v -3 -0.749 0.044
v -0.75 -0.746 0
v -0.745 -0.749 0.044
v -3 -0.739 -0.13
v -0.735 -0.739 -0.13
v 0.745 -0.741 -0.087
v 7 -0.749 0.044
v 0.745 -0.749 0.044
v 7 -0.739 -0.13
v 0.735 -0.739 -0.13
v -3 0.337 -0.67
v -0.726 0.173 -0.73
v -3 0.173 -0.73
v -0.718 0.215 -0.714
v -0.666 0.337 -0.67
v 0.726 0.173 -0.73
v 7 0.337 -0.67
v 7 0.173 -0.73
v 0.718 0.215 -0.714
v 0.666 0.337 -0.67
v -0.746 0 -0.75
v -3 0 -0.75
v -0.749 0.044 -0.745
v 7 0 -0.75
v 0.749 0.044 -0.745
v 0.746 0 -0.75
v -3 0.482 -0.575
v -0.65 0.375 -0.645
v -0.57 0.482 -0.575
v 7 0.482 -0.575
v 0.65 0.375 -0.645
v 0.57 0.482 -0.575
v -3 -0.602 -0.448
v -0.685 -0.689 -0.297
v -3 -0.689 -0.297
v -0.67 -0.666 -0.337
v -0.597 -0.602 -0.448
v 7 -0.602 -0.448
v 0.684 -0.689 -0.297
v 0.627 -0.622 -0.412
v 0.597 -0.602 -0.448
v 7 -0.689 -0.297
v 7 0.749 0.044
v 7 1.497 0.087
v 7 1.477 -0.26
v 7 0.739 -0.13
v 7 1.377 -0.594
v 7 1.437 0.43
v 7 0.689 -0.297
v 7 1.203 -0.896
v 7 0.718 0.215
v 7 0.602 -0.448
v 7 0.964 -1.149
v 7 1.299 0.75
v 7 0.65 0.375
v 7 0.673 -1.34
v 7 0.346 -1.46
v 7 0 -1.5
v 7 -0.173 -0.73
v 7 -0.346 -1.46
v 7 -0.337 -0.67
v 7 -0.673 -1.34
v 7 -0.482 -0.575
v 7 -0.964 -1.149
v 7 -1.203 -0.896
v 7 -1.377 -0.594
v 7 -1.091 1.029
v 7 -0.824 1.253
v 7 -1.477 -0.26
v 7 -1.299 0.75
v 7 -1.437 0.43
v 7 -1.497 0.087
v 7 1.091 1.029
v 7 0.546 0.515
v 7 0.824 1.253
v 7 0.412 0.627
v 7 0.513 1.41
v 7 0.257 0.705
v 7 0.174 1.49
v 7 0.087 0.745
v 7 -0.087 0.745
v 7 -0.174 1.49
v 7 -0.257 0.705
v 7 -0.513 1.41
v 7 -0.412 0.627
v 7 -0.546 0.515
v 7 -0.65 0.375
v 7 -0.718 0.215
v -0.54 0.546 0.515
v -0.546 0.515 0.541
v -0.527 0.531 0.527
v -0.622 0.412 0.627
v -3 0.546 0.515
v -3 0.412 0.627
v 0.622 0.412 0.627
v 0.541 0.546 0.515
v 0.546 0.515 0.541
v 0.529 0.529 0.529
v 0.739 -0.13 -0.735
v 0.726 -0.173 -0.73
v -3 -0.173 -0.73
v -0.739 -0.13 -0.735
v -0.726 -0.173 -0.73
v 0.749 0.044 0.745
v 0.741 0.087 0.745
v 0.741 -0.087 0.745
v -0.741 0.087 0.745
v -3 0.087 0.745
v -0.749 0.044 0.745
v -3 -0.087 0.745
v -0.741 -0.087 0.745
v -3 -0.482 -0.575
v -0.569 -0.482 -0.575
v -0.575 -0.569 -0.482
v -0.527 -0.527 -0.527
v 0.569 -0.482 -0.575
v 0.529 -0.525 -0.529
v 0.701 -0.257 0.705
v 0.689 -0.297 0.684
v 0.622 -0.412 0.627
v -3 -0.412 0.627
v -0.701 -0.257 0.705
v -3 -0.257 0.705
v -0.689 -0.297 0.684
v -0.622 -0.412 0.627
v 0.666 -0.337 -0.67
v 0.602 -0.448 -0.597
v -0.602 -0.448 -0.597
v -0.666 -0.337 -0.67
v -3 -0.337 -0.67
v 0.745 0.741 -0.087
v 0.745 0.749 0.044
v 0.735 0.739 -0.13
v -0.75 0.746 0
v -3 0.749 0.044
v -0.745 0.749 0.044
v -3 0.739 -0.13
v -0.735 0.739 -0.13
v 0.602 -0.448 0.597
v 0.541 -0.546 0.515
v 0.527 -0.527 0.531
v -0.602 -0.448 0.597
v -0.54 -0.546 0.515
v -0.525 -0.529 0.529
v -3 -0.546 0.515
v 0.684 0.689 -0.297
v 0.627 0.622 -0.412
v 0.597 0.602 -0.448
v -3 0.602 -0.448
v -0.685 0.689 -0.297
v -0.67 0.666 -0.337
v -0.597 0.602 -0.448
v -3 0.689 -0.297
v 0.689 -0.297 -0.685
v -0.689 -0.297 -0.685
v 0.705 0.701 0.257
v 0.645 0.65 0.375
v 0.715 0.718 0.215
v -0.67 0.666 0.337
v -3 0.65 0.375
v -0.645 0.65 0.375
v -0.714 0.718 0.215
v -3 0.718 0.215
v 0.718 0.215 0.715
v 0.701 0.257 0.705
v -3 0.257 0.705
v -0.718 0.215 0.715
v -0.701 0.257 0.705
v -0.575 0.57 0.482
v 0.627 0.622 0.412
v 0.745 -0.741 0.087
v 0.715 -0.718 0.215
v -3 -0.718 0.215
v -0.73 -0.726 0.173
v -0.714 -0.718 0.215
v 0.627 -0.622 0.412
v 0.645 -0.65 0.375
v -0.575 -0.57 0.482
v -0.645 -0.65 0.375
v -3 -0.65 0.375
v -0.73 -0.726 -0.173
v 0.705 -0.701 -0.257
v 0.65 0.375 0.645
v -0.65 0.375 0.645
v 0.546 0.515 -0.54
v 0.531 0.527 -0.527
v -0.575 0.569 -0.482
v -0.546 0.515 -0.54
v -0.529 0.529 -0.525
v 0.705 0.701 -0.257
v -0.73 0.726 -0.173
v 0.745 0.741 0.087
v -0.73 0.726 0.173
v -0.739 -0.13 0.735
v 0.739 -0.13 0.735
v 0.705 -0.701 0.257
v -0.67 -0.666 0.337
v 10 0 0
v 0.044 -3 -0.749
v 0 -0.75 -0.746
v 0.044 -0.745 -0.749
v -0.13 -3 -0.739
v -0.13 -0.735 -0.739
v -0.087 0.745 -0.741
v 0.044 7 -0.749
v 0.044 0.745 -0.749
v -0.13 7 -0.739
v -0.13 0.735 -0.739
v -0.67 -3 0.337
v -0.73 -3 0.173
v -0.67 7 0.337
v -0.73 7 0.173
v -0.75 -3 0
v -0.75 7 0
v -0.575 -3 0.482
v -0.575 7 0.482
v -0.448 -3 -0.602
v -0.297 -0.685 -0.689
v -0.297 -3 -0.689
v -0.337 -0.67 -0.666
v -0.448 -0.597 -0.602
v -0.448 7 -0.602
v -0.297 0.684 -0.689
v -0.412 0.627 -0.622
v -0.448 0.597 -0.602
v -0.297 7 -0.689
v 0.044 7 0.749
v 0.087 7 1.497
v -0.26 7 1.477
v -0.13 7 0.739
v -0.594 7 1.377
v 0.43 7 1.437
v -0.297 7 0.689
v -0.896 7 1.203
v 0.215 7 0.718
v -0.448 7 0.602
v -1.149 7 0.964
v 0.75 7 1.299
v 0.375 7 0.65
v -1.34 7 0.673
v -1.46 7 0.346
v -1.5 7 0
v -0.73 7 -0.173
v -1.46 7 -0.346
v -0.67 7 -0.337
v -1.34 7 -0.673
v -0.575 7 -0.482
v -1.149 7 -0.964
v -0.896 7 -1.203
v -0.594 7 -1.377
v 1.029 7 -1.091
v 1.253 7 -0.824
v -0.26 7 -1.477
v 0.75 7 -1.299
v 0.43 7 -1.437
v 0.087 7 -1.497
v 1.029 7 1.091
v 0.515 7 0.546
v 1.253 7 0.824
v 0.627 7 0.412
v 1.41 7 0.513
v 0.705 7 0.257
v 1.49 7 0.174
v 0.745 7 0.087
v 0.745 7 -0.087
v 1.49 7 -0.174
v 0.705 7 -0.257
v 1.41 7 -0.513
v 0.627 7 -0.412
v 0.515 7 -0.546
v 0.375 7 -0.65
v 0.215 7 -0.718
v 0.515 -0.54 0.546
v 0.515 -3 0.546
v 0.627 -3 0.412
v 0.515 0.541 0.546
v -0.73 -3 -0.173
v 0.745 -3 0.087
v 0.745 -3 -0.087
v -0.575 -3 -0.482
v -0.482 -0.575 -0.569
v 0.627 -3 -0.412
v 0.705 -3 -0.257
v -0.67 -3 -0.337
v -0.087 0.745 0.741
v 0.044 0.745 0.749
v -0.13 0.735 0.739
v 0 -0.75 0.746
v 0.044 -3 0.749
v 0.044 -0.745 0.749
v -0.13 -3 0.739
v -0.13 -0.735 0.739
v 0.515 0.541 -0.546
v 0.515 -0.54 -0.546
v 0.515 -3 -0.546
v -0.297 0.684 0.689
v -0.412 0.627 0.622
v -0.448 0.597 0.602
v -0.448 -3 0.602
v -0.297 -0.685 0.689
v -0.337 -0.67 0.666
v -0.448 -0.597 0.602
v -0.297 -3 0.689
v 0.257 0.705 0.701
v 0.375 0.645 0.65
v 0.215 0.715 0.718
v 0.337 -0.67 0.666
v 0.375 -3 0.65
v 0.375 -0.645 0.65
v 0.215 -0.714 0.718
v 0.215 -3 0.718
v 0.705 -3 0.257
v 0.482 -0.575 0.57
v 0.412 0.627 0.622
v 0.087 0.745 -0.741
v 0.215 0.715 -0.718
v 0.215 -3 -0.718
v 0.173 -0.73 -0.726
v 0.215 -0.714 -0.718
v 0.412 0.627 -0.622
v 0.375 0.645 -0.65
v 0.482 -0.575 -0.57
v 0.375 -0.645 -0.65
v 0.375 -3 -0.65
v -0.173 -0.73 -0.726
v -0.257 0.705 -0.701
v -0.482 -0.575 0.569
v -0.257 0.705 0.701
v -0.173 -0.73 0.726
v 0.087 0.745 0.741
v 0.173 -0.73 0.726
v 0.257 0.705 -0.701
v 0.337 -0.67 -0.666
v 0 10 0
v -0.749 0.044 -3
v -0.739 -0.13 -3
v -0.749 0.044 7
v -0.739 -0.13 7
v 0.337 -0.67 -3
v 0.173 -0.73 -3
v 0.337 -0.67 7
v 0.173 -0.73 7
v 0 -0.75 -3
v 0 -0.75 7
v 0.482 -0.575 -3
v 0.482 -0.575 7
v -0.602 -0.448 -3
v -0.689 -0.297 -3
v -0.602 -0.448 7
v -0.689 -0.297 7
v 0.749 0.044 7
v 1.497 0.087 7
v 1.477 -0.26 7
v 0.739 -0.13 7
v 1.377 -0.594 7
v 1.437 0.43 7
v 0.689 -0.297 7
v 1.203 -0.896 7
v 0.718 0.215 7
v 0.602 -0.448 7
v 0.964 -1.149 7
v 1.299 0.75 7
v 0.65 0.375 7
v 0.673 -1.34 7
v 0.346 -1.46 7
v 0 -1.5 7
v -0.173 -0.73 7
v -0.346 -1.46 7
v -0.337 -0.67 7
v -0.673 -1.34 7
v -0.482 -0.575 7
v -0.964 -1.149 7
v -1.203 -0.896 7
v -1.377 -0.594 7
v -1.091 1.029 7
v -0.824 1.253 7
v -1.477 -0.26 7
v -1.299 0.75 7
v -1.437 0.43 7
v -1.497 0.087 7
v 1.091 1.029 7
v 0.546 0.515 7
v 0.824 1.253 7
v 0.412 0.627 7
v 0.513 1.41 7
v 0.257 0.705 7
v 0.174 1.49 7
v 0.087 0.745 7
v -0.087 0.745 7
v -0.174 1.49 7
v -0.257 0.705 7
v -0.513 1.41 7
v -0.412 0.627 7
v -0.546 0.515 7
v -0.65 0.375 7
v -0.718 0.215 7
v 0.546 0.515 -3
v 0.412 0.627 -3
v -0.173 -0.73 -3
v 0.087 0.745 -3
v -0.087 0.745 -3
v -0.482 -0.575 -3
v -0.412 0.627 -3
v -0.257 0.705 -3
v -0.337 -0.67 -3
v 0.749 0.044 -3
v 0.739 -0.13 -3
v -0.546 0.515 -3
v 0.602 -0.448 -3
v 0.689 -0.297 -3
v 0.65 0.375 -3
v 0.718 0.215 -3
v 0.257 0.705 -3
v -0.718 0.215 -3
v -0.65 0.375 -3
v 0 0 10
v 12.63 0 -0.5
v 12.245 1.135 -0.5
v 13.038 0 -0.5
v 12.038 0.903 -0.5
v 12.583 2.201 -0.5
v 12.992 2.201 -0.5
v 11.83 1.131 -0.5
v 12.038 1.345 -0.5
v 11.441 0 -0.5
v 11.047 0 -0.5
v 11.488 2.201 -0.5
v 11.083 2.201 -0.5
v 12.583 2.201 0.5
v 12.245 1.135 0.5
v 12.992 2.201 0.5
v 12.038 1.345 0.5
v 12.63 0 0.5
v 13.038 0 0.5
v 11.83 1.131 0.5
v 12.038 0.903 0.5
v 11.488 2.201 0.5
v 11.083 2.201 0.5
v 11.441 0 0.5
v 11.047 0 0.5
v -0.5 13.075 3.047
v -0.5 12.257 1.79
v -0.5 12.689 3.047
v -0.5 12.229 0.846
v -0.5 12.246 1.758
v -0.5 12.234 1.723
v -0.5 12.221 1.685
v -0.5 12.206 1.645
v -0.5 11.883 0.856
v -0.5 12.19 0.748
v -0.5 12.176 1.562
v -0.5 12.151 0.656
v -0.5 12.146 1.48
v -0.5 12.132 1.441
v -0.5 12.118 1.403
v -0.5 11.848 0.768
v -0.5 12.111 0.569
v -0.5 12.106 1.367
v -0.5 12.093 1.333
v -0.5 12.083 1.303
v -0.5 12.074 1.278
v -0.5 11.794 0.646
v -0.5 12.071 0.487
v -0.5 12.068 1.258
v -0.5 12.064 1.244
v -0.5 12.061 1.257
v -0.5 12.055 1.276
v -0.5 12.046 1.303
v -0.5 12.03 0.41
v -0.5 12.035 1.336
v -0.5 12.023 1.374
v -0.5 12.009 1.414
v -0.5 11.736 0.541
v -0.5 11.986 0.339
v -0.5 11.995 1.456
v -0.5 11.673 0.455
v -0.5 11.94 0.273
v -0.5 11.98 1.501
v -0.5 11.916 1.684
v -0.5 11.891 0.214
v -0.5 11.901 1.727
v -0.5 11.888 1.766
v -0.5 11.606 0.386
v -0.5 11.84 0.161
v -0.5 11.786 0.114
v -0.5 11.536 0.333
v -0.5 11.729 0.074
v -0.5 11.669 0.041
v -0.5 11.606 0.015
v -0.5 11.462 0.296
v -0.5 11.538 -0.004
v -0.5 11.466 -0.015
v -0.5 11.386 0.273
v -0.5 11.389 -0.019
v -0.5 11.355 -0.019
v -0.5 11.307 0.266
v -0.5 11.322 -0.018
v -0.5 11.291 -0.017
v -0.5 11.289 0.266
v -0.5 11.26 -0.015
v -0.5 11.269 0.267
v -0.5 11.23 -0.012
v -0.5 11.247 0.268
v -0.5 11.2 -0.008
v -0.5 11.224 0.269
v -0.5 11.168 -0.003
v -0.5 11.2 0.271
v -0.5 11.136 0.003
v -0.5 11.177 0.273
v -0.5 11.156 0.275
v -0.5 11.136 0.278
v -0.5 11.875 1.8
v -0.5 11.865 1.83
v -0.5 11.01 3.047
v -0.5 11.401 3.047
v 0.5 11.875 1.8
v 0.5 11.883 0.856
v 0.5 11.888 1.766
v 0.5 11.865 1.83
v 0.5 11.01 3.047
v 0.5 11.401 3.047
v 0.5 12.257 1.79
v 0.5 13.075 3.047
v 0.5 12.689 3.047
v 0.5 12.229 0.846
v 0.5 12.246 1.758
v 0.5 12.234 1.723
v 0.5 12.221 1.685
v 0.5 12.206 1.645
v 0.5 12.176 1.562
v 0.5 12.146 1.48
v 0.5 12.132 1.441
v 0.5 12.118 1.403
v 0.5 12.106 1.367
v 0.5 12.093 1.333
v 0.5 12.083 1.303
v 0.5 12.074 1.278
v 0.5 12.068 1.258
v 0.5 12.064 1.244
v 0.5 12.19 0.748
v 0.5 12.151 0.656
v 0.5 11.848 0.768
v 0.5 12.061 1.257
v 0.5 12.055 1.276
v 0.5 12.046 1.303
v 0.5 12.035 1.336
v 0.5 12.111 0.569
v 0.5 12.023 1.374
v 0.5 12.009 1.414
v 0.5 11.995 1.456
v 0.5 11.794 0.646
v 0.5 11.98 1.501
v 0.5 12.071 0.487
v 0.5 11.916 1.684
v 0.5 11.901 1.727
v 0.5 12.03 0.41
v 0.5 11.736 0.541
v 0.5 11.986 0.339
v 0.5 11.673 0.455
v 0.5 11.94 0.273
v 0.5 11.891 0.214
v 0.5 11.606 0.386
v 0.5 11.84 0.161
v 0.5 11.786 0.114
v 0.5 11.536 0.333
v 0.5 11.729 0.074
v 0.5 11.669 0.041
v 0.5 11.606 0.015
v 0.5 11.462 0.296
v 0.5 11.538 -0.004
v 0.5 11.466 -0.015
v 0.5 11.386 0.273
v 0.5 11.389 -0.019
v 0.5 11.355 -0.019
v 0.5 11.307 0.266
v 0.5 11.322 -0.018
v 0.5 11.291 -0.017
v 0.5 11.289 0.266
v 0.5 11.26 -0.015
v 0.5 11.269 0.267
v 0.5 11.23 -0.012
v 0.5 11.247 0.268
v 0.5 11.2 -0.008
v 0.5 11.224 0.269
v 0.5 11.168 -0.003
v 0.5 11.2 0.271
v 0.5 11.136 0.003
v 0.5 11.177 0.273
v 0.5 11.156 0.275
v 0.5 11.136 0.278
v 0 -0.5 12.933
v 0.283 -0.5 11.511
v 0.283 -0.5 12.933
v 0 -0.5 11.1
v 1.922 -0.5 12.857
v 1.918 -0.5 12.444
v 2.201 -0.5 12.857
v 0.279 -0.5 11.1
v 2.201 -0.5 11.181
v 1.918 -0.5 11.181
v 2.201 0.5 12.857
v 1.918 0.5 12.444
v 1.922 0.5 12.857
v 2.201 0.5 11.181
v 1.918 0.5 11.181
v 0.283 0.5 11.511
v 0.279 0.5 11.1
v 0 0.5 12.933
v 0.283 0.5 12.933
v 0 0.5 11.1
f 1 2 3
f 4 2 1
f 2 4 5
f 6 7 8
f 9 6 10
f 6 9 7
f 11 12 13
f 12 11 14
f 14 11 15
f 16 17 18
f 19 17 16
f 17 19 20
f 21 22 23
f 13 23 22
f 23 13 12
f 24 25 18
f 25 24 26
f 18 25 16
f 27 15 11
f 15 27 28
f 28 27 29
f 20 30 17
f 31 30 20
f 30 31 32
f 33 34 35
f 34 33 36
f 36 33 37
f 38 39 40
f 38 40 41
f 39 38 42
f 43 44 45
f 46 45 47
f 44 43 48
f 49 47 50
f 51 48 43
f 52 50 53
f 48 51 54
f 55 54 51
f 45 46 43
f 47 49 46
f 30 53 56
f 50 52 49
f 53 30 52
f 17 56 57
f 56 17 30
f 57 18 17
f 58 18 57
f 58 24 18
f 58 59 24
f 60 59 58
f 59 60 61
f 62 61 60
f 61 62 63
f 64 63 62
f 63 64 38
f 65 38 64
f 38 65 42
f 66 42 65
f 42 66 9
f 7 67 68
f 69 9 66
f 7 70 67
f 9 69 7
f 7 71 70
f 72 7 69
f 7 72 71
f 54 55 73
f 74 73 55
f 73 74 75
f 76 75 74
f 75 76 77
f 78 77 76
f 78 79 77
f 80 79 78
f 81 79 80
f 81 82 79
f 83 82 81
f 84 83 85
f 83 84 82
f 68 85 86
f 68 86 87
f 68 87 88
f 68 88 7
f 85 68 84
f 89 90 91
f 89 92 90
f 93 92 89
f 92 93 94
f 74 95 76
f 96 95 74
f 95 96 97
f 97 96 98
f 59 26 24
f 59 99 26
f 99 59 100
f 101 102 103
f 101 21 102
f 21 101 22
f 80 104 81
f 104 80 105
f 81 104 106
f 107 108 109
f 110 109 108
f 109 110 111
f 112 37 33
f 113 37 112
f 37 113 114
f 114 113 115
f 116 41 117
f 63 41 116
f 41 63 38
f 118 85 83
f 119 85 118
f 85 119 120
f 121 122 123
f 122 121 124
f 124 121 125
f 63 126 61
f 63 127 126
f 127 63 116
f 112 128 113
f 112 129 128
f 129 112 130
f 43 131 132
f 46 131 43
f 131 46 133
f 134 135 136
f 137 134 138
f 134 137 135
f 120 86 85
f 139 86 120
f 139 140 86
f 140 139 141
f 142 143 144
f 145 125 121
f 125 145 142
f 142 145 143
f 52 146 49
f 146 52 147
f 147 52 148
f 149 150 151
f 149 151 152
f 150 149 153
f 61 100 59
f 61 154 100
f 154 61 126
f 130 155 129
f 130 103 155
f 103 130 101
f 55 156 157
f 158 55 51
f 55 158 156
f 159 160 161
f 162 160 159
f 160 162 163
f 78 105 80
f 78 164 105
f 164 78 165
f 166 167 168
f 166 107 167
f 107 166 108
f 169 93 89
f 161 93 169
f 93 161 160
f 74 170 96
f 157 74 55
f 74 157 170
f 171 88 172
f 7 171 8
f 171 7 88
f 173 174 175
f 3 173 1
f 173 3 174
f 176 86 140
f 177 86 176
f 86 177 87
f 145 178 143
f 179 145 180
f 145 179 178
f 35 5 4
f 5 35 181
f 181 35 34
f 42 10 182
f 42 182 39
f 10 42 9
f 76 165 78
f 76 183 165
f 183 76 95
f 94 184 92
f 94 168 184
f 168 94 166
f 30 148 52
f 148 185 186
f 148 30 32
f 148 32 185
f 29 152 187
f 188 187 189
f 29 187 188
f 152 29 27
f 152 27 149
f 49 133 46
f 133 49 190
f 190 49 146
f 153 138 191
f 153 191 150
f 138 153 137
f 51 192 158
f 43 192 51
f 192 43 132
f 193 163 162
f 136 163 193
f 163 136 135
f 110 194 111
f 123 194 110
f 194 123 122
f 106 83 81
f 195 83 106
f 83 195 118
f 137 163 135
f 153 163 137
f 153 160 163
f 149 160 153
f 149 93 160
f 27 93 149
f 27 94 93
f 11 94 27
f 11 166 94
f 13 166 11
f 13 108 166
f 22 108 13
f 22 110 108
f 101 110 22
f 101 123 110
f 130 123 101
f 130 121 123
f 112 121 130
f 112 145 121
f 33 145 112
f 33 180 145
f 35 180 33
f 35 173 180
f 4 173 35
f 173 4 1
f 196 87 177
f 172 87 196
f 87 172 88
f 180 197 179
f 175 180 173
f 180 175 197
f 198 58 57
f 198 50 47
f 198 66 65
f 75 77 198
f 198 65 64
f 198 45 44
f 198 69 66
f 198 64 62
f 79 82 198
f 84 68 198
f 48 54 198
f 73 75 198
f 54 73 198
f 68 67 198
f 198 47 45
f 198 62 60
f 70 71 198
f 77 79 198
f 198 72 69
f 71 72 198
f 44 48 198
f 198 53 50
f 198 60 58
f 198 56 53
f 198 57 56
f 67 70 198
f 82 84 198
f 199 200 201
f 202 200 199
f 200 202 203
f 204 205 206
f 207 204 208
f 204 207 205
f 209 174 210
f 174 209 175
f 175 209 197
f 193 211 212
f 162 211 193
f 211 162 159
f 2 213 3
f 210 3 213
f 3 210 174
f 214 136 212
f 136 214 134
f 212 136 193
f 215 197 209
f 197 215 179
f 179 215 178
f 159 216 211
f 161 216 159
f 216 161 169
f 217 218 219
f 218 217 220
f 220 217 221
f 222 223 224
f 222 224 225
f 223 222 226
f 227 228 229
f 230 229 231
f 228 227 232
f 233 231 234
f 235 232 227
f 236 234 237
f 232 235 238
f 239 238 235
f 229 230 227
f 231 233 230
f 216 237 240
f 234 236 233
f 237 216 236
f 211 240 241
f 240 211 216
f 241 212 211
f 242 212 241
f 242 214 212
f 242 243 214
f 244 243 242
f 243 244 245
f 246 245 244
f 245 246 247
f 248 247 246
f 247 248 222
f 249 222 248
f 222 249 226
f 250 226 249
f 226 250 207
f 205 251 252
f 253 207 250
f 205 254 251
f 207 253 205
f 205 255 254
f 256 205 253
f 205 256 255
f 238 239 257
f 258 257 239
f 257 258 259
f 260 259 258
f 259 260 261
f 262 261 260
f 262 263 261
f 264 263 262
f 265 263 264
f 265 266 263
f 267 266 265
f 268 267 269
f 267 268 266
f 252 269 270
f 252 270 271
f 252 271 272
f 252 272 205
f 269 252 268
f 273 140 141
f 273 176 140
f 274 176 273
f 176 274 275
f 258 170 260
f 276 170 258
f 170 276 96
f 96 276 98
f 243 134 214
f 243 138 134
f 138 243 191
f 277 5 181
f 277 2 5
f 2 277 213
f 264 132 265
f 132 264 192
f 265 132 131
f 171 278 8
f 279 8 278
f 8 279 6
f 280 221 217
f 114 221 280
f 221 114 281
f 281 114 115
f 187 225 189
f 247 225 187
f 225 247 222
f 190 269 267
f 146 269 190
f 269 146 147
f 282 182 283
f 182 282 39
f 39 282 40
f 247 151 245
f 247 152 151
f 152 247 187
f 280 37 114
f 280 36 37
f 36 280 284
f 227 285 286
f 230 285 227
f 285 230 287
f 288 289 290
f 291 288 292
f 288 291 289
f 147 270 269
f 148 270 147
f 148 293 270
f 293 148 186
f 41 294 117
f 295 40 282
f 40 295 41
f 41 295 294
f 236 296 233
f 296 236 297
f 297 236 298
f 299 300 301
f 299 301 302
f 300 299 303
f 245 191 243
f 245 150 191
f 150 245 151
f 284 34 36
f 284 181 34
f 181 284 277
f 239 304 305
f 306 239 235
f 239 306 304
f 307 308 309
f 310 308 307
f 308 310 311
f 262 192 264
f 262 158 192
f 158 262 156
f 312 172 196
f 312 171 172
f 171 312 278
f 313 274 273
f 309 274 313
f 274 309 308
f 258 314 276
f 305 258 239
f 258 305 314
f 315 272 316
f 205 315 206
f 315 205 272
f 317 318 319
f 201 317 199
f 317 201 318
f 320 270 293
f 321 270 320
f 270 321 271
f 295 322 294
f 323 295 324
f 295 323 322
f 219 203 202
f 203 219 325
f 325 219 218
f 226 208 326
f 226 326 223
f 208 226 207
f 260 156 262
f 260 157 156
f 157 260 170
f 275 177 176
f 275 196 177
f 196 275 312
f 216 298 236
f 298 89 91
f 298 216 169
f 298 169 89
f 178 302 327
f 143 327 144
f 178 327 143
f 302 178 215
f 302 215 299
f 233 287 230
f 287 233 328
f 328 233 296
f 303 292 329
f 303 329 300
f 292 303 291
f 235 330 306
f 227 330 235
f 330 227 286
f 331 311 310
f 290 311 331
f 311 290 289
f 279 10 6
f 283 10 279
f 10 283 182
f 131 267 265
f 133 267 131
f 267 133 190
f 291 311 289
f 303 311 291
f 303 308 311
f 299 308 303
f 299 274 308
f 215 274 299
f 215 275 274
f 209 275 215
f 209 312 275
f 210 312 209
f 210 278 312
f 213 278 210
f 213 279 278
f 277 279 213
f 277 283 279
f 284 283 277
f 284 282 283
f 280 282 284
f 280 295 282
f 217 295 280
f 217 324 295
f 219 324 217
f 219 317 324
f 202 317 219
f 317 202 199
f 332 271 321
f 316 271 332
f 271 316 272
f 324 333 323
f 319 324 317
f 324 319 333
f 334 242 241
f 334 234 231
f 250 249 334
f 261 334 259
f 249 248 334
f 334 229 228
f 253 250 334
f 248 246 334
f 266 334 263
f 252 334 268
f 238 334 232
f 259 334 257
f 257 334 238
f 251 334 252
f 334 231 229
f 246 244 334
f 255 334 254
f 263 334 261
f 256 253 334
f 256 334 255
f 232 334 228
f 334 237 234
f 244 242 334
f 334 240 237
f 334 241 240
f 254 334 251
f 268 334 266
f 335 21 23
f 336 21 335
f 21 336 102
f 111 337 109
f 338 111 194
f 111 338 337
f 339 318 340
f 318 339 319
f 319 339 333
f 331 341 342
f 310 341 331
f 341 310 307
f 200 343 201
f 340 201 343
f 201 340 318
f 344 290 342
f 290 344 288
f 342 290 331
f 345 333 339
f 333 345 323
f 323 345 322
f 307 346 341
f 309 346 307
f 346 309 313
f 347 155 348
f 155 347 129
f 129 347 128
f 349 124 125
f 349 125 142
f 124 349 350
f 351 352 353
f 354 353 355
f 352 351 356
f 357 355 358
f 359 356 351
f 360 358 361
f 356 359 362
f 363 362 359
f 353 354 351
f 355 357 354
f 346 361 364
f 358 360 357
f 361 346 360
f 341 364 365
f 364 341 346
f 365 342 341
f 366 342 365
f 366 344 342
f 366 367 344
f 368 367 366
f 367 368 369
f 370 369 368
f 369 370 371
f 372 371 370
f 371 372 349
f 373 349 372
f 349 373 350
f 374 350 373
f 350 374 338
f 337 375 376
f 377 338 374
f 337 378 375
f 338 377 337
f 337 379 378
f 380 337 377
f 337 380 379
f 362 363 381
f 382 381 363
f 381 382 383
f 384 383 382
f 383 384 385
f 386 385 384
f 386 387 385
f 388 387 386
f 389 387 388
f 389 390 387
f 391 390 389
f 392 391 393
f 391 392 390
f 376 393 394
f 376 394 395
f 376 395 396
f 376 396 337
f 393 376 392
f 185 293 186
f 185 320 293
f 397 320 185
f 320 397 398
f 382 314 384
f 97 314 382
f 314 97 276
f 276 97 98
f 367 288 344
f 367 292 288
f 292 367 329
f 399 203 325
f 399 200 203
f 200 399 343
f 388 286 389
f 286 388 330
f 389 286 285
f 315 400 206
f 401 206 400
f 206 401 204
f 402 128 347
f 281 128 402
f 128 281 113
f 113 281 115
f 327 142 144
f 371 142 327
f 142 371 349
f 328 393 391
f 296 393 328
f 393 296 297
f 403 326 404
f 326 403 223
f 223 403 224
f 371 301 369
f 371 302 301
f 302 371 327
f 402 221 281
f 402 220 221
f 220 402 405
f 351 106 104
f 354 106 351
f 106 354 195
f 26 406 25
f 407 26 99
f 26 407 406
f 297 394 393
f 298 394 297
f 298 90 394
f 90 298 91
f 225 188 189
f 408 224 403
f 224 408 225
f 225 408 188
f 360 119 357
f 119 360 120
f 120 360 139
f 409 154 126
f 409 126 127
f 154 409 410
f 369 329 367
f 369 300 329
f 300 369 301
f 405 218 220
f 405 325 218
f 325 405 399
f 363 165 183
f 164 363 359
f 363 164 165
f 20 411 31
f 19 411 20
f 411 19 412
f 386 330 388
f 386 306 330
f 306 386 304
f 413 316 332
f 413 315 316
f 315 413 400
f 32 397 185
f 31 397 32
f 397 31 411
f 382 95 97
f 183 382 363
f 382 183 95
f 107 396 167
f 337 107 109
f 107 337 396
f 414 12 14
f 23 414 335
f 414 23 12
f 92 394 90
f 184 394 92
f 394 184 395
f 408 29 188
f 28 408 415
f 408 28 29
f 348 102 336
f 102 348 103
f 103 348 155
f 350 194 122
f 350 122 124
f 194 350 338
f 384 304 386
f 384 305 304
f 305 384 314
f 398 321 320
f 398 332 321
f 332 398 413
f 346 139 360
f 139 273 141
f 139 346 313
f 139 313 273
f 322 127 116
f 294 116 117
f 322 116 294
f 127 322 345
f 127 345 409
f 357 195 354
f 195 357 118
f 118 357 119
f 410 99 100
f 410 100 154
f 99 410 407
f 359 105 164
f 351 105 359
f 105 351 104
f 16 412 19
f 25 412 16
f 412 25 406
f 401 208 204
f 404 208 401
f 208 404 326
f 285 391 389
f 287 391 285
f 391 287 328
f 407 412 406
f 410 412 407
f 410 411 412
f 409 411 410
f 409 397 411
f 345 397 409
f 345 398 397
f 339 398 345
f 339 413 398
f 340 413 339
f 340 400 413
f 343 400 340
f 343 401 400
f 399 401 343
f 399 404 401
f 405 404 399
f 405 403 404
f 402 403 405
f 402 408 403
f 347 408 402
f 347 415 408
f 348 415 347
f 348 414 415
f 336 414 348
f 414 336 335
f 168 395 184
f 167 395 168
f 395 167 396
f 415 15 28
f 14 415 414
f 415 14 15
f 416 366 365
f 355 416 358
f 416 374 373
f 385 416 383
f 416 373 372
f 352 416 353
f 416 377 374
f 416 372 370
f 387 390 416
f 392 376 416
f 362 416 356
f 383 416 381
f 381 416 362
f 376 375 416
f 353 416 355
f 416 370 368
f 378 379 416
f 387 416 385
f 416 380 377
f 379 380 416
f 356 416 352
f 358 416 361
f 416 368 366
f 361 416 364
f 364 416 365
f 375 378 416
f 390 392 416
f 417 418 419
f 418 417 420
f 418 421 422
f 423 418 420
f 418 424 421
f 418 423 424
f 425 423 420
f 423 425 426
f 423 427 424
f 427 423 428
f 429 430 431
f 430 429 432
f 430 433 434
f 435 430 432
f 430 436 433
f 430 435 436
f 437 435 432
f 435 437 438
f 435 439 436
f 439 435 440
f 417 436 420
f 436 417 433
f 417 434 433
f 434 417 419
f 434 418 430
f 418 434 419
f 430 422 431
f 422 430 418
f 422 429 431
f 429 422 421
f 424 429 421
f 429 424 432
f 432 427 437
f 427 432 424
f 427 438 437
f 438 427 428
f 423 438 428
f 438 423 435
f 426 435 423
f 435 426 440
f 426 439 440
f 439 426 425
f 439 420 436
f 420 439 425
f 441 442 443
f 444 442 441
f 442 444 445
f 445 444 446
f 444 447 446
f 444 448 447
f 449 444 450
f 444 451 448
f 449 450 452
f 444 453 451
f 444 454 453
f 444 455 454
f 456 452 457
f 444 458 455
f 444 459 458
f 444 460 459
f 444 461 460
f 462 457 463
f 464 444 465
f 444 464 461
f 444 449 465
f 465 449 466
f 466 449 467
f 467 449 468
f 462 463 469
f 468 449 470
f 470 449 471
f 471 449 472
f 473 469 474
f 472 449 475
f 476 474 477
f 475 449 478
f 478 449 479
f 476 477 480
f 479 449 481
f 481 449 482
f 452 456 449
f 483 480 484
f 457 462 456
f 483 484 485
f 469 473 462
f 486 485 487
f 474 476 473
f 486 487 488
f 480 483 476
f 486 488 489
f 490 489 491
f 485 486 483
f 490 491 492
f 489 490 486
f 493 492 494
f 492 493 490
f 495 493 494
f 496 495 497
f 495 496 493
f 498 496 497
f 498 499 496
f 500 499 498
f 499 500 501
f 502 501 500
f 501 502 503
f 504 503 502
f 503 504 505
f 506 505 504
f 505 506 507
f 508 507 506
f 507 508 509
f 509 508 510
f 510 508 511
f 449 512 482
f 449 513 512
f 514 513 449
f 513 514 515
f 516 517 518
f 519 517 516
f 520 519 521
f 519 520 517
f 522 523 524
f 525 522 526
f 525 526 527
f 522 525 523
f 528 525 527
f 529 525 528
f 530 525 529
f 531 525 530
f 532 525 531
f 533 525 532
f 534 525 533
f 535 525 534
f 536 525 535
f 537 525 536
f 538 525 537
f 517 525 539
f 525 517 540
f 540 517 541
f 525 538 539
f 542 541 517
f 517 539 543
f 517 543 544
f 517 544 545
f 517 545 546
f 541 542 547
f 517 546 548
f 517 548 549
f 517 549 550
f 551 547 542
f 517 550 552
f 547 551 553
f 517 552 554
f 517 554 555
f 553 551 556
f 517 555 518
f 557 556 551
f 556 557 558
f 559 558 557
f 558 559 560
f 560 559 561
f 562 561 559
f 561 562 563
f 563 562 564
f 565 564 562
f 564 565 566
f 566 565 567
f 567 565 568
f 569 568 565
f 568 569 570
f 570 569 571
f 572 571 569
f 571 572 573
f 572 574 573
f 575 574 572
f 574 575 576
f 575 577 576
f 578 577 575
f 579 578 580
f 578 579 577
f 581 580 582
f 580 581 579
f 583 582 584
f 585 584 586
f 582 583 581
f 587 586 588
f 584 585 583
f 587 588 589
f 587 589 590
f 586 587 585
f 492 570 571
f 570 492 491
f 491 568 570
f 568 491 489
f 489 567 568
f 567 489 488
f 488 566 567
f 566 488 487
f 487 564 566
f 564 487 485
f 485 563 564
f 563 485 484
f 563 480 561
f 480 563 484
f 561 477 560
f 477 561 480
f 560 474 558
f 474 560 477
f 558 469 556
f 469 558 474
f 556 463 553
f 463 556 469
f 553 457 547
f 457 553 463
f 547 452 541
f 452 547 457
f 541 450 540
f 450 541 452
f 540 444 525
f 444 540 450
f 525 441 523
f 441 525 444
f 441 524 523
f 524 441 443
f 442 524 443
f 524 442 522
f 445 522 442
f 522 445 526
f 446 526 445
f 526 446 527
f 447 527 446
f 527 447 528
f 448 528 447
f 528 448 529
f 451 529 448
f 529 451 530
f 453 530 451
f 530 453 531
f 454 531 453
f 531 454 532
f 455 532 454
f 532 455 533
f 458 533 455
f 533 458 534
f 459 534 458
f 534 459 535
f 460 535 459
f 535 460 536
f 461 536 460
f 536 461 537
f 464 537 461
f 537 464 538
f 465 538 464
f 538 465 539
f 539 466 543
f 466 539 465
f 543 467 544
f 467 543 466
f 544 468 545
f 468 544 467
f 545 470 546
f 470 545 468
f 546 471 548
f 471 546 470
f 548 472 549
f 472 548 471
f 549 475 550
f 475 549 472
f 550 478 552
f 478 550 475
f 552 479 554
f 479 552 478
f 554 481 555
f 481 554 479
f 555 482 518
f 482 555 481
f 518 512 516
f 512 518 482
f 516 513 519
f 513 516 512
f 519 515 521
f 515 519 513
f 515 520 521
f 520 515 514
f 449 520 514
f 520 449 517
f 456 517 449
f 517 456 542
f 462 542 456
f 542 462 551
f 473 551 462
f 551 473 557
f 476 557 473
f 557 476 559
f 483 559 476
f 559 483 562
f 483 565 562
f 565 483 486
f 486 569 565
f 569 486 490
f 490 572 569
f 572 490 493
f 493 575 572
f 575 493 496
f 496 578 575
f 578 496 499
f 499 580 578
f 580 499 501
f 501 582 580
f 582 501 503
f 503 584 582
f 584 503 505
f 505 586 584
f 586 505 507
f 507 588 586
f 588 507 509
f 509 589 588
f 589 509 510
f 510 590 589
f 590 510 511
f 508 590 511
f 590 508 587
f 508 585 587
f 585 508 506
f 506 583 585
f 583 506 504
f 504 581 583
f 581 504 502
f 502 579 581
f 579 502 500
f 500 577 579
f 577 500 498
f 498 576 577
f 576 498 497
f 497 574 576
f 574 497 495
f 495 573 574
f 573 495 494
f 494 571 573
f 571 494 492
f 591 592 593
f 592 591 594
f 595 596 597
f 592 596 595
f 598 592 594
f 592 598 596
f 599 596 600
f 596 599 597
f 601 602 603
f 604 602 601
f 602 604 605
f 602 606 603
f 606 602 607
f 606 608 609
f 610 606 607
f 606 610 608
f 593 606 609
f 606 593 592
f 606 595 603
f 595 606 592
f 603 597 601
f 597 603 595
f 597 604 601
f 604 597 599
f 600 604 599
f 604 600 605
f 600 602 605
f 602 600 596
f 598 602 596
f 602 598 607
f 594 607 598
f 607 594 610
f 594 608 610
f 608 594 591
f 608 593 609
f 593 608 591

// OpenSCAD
// Start: lazy_union
default_5_default_5();
// End: lazy_union

// Modules.

// 'PartMaterial undef-default - undef-default'
module default_5_default_5() {
  // 'None : _combine_solids_and_holes'
  union() {
    // 'coordinates : _combine_solids_and_holes'
    union() {
      // 'coords : _combine_solids_and_holes'
      union() {
        // 'x_arrow'
        multmatrix(m=[[0.0, 0.0, -1.0, -3.0], [0.0, -1.0, 0.0, 0.0], [-1.0, 0.0, 0.0, 0.0], [0.0, 0.0, 0.0, 1.0]]) {
          // 'x_arrow'
          color(c=[1.0, 0.0, 0.0, 1.0]) {
            // 'x_arrow : _combine_solids_and_holes'
            union() {
              // 'stem'
              multmatrix(m=[[1.0, 0.0, 0.0, 0.0], [-0.0, -1.0, -0.0, -0.0], [-0.0, -0.0, -1.0, -0.0], [0.0, 0.0, 0.0, 1.0]]) {
                // 'stem : _combine_solids_and_holes'
                union() {
                  // 'stem'
                  cylinder(h=10.0, r1=0.75, r2=0.75, center=false, $fn=27);
                }
              }
              // 'head'
              multmatrix(m=[[1.0, 0.0, 0.0, 0.0], [0.0, -1.0, 0.0, 0.0], [0.0, 0.0, -1.0, -10.0], [0.0, 0.0, 0.0, 1.0]]) {
                // 'head : _combine_solids_and_holes'
                union() {
                  // 'head'
                  cylinder(h=3.0, r1=1.5, r2=0.0, center=false, $fn=27);
                }
              }
            }
          }
        }
        // 'y_arrow'
        multmatrix(m=[[-1.0, 0.0, 0.0, 0.0], [0.0, 0.0, -1.0, -3.0], [0.0, -1.0, 0.0, 0.0], [0.0, 0.0, 0.0, 1.0]]) {
          // 'y_arrow'
          color(c=[0.0, 0.5019607843137255, 0.0, 1.0]) {
            // 'y_arrow : _combine_solids_and_holes'
            union() {
              // 'stem'
              multmatrix(m=[[1.0, 0.0, 0.0, 0.0], [-0.0, -1.0, -0.0, -0.0], [-0.0, -0.0, -1.0, -0.0], [0.0, 0.0, 0.0, 1.0]]) {
                // 'stem : _combine_solids_and_holes'
                union() {
                  // 'stem'
                  cylinder(h=10.0, r1=0.75, r2=0.75, center=false, $fn=27);
                }
              }
              // 'head'
              multmatrix(m=[[1.0, 0.0, 0.0, 0.0], [0.0, -1.0, 0.0, 0.0], [0.0, 0.0, -1.0, -10.0], [0.0, 0.0, 0.0, 1.0]]) {
                // 'head : _combine_solids_and_holes'
                union() {
                  // 'head'
                  cylinder(h=3.0, r1=1.5, r2=0.0, center=false, $fn=27);
                }
              }
            }
          }
        }
        // 'z_arrow'
        multmatrix(m=[[0.0, -1.0, 0.0, 0.0], [-1.0, 0.0, 0.0, 0.0], [0.0, 0.0, -1.0, -3.0], [0.0, 0.0, 0.0, 1.0]]) {
          // 'z_arrow'
          color(c=[0.0, 0.0, 1.0, 1.0]) {
            // 'z_arrow : _combine_solids_and_holes'
            union() {
              // 'stem'
              multmatrix(m=[[1.0, 0.0, 0.0, 0.0], [-0.0, -1.0, -0.0, -0.0], [-0.0, -0.0, -1.0, -0.0], [0.0, 0.0, 0.0, 1.0]]) {
                // 'stem : _combine_solids_and_holes'
                union() {
                  // 'stem'
                  cylinder(h=10.0, r1=0.75, r2=0.75, center=false, $fn=27);
                }
              }
              // 'head'
              multmatrix(m=[[1.0, 0.0, 0.0, 0.0], [0.0, -1.0, 0.0, 0.0], [0.0, 0.0, -1.0, -10.0], [0.0, 0.0, 0.0, 1.0]]) {
                // 'head : _combine_solids_and_holes'
                union() {
                  // 'head'
                  cylinder(h=3.0, r1=1.5, r2=0.0, center=false, $fn=27);
                }
              }
            }
          }
        }
      }
      // 'x'
      multmatrix(m=[[1.0, 0.0, 0.0, 11.0], [0.0, 1.0, 0.0, 0.0], [0.0, 0.0, 1.0, -0.5], [0.0, 0.0, 0.0, 1.0]]) {
        // 'x : _combine_solids_and_holes'
        union() {
          // 'x'
          linear_extrude(height=1.0) {
            translate(v=[0.0, 0.0, -0.5]) {
              text(text="x", size=3.0, halign="left", valign="bottom", spacing=1.0, direction="ltr", $fn=27);
            }
          }
        }
      }
      // 'y'
      multmatrix(m=[[0.0, 0.0, 1.0, -0.5], [1.0, 0.0, 0.0, 11.0], [0.0, 1.0, 0.0, 0.0], [0.0, 0.0, 0.0, 1.0]]) {
        // 'y : _combine_solids_and_holes'
        union() {
          // 'y'
          linear_extrude(height=1.0) {
            translate(v=[0.0, 0.0, -0.5]) {
              text(text="y", size=3.0, halign="left", valign="bottom", spacing=1.0, direction="ltr", $fn=27);
            }
          }
        }
      }
      // 'z'
      multmatrix(m=[[0.0, 1.0, 0.0, 0.0], [0.0, 0.0, 1.0, -0.5], [1.0, 0.0, 0.0, 11.0], [0.0, 0.0, 0.0, 1.0]]) {
        // 'z : _combine_solids_and_holes'
        union() {
          // 'z'
          linear_extrude(height=1.0) {
            translate(v=[0.0, 0.0, -0.5]) {
              text(text="z", size=3.0, halign="left", valign="bottom", spacing=1.0, direction="ltr", $fn=27);
            }
          }
        }
      }
    }
  }
} // end module default_5_default_5
